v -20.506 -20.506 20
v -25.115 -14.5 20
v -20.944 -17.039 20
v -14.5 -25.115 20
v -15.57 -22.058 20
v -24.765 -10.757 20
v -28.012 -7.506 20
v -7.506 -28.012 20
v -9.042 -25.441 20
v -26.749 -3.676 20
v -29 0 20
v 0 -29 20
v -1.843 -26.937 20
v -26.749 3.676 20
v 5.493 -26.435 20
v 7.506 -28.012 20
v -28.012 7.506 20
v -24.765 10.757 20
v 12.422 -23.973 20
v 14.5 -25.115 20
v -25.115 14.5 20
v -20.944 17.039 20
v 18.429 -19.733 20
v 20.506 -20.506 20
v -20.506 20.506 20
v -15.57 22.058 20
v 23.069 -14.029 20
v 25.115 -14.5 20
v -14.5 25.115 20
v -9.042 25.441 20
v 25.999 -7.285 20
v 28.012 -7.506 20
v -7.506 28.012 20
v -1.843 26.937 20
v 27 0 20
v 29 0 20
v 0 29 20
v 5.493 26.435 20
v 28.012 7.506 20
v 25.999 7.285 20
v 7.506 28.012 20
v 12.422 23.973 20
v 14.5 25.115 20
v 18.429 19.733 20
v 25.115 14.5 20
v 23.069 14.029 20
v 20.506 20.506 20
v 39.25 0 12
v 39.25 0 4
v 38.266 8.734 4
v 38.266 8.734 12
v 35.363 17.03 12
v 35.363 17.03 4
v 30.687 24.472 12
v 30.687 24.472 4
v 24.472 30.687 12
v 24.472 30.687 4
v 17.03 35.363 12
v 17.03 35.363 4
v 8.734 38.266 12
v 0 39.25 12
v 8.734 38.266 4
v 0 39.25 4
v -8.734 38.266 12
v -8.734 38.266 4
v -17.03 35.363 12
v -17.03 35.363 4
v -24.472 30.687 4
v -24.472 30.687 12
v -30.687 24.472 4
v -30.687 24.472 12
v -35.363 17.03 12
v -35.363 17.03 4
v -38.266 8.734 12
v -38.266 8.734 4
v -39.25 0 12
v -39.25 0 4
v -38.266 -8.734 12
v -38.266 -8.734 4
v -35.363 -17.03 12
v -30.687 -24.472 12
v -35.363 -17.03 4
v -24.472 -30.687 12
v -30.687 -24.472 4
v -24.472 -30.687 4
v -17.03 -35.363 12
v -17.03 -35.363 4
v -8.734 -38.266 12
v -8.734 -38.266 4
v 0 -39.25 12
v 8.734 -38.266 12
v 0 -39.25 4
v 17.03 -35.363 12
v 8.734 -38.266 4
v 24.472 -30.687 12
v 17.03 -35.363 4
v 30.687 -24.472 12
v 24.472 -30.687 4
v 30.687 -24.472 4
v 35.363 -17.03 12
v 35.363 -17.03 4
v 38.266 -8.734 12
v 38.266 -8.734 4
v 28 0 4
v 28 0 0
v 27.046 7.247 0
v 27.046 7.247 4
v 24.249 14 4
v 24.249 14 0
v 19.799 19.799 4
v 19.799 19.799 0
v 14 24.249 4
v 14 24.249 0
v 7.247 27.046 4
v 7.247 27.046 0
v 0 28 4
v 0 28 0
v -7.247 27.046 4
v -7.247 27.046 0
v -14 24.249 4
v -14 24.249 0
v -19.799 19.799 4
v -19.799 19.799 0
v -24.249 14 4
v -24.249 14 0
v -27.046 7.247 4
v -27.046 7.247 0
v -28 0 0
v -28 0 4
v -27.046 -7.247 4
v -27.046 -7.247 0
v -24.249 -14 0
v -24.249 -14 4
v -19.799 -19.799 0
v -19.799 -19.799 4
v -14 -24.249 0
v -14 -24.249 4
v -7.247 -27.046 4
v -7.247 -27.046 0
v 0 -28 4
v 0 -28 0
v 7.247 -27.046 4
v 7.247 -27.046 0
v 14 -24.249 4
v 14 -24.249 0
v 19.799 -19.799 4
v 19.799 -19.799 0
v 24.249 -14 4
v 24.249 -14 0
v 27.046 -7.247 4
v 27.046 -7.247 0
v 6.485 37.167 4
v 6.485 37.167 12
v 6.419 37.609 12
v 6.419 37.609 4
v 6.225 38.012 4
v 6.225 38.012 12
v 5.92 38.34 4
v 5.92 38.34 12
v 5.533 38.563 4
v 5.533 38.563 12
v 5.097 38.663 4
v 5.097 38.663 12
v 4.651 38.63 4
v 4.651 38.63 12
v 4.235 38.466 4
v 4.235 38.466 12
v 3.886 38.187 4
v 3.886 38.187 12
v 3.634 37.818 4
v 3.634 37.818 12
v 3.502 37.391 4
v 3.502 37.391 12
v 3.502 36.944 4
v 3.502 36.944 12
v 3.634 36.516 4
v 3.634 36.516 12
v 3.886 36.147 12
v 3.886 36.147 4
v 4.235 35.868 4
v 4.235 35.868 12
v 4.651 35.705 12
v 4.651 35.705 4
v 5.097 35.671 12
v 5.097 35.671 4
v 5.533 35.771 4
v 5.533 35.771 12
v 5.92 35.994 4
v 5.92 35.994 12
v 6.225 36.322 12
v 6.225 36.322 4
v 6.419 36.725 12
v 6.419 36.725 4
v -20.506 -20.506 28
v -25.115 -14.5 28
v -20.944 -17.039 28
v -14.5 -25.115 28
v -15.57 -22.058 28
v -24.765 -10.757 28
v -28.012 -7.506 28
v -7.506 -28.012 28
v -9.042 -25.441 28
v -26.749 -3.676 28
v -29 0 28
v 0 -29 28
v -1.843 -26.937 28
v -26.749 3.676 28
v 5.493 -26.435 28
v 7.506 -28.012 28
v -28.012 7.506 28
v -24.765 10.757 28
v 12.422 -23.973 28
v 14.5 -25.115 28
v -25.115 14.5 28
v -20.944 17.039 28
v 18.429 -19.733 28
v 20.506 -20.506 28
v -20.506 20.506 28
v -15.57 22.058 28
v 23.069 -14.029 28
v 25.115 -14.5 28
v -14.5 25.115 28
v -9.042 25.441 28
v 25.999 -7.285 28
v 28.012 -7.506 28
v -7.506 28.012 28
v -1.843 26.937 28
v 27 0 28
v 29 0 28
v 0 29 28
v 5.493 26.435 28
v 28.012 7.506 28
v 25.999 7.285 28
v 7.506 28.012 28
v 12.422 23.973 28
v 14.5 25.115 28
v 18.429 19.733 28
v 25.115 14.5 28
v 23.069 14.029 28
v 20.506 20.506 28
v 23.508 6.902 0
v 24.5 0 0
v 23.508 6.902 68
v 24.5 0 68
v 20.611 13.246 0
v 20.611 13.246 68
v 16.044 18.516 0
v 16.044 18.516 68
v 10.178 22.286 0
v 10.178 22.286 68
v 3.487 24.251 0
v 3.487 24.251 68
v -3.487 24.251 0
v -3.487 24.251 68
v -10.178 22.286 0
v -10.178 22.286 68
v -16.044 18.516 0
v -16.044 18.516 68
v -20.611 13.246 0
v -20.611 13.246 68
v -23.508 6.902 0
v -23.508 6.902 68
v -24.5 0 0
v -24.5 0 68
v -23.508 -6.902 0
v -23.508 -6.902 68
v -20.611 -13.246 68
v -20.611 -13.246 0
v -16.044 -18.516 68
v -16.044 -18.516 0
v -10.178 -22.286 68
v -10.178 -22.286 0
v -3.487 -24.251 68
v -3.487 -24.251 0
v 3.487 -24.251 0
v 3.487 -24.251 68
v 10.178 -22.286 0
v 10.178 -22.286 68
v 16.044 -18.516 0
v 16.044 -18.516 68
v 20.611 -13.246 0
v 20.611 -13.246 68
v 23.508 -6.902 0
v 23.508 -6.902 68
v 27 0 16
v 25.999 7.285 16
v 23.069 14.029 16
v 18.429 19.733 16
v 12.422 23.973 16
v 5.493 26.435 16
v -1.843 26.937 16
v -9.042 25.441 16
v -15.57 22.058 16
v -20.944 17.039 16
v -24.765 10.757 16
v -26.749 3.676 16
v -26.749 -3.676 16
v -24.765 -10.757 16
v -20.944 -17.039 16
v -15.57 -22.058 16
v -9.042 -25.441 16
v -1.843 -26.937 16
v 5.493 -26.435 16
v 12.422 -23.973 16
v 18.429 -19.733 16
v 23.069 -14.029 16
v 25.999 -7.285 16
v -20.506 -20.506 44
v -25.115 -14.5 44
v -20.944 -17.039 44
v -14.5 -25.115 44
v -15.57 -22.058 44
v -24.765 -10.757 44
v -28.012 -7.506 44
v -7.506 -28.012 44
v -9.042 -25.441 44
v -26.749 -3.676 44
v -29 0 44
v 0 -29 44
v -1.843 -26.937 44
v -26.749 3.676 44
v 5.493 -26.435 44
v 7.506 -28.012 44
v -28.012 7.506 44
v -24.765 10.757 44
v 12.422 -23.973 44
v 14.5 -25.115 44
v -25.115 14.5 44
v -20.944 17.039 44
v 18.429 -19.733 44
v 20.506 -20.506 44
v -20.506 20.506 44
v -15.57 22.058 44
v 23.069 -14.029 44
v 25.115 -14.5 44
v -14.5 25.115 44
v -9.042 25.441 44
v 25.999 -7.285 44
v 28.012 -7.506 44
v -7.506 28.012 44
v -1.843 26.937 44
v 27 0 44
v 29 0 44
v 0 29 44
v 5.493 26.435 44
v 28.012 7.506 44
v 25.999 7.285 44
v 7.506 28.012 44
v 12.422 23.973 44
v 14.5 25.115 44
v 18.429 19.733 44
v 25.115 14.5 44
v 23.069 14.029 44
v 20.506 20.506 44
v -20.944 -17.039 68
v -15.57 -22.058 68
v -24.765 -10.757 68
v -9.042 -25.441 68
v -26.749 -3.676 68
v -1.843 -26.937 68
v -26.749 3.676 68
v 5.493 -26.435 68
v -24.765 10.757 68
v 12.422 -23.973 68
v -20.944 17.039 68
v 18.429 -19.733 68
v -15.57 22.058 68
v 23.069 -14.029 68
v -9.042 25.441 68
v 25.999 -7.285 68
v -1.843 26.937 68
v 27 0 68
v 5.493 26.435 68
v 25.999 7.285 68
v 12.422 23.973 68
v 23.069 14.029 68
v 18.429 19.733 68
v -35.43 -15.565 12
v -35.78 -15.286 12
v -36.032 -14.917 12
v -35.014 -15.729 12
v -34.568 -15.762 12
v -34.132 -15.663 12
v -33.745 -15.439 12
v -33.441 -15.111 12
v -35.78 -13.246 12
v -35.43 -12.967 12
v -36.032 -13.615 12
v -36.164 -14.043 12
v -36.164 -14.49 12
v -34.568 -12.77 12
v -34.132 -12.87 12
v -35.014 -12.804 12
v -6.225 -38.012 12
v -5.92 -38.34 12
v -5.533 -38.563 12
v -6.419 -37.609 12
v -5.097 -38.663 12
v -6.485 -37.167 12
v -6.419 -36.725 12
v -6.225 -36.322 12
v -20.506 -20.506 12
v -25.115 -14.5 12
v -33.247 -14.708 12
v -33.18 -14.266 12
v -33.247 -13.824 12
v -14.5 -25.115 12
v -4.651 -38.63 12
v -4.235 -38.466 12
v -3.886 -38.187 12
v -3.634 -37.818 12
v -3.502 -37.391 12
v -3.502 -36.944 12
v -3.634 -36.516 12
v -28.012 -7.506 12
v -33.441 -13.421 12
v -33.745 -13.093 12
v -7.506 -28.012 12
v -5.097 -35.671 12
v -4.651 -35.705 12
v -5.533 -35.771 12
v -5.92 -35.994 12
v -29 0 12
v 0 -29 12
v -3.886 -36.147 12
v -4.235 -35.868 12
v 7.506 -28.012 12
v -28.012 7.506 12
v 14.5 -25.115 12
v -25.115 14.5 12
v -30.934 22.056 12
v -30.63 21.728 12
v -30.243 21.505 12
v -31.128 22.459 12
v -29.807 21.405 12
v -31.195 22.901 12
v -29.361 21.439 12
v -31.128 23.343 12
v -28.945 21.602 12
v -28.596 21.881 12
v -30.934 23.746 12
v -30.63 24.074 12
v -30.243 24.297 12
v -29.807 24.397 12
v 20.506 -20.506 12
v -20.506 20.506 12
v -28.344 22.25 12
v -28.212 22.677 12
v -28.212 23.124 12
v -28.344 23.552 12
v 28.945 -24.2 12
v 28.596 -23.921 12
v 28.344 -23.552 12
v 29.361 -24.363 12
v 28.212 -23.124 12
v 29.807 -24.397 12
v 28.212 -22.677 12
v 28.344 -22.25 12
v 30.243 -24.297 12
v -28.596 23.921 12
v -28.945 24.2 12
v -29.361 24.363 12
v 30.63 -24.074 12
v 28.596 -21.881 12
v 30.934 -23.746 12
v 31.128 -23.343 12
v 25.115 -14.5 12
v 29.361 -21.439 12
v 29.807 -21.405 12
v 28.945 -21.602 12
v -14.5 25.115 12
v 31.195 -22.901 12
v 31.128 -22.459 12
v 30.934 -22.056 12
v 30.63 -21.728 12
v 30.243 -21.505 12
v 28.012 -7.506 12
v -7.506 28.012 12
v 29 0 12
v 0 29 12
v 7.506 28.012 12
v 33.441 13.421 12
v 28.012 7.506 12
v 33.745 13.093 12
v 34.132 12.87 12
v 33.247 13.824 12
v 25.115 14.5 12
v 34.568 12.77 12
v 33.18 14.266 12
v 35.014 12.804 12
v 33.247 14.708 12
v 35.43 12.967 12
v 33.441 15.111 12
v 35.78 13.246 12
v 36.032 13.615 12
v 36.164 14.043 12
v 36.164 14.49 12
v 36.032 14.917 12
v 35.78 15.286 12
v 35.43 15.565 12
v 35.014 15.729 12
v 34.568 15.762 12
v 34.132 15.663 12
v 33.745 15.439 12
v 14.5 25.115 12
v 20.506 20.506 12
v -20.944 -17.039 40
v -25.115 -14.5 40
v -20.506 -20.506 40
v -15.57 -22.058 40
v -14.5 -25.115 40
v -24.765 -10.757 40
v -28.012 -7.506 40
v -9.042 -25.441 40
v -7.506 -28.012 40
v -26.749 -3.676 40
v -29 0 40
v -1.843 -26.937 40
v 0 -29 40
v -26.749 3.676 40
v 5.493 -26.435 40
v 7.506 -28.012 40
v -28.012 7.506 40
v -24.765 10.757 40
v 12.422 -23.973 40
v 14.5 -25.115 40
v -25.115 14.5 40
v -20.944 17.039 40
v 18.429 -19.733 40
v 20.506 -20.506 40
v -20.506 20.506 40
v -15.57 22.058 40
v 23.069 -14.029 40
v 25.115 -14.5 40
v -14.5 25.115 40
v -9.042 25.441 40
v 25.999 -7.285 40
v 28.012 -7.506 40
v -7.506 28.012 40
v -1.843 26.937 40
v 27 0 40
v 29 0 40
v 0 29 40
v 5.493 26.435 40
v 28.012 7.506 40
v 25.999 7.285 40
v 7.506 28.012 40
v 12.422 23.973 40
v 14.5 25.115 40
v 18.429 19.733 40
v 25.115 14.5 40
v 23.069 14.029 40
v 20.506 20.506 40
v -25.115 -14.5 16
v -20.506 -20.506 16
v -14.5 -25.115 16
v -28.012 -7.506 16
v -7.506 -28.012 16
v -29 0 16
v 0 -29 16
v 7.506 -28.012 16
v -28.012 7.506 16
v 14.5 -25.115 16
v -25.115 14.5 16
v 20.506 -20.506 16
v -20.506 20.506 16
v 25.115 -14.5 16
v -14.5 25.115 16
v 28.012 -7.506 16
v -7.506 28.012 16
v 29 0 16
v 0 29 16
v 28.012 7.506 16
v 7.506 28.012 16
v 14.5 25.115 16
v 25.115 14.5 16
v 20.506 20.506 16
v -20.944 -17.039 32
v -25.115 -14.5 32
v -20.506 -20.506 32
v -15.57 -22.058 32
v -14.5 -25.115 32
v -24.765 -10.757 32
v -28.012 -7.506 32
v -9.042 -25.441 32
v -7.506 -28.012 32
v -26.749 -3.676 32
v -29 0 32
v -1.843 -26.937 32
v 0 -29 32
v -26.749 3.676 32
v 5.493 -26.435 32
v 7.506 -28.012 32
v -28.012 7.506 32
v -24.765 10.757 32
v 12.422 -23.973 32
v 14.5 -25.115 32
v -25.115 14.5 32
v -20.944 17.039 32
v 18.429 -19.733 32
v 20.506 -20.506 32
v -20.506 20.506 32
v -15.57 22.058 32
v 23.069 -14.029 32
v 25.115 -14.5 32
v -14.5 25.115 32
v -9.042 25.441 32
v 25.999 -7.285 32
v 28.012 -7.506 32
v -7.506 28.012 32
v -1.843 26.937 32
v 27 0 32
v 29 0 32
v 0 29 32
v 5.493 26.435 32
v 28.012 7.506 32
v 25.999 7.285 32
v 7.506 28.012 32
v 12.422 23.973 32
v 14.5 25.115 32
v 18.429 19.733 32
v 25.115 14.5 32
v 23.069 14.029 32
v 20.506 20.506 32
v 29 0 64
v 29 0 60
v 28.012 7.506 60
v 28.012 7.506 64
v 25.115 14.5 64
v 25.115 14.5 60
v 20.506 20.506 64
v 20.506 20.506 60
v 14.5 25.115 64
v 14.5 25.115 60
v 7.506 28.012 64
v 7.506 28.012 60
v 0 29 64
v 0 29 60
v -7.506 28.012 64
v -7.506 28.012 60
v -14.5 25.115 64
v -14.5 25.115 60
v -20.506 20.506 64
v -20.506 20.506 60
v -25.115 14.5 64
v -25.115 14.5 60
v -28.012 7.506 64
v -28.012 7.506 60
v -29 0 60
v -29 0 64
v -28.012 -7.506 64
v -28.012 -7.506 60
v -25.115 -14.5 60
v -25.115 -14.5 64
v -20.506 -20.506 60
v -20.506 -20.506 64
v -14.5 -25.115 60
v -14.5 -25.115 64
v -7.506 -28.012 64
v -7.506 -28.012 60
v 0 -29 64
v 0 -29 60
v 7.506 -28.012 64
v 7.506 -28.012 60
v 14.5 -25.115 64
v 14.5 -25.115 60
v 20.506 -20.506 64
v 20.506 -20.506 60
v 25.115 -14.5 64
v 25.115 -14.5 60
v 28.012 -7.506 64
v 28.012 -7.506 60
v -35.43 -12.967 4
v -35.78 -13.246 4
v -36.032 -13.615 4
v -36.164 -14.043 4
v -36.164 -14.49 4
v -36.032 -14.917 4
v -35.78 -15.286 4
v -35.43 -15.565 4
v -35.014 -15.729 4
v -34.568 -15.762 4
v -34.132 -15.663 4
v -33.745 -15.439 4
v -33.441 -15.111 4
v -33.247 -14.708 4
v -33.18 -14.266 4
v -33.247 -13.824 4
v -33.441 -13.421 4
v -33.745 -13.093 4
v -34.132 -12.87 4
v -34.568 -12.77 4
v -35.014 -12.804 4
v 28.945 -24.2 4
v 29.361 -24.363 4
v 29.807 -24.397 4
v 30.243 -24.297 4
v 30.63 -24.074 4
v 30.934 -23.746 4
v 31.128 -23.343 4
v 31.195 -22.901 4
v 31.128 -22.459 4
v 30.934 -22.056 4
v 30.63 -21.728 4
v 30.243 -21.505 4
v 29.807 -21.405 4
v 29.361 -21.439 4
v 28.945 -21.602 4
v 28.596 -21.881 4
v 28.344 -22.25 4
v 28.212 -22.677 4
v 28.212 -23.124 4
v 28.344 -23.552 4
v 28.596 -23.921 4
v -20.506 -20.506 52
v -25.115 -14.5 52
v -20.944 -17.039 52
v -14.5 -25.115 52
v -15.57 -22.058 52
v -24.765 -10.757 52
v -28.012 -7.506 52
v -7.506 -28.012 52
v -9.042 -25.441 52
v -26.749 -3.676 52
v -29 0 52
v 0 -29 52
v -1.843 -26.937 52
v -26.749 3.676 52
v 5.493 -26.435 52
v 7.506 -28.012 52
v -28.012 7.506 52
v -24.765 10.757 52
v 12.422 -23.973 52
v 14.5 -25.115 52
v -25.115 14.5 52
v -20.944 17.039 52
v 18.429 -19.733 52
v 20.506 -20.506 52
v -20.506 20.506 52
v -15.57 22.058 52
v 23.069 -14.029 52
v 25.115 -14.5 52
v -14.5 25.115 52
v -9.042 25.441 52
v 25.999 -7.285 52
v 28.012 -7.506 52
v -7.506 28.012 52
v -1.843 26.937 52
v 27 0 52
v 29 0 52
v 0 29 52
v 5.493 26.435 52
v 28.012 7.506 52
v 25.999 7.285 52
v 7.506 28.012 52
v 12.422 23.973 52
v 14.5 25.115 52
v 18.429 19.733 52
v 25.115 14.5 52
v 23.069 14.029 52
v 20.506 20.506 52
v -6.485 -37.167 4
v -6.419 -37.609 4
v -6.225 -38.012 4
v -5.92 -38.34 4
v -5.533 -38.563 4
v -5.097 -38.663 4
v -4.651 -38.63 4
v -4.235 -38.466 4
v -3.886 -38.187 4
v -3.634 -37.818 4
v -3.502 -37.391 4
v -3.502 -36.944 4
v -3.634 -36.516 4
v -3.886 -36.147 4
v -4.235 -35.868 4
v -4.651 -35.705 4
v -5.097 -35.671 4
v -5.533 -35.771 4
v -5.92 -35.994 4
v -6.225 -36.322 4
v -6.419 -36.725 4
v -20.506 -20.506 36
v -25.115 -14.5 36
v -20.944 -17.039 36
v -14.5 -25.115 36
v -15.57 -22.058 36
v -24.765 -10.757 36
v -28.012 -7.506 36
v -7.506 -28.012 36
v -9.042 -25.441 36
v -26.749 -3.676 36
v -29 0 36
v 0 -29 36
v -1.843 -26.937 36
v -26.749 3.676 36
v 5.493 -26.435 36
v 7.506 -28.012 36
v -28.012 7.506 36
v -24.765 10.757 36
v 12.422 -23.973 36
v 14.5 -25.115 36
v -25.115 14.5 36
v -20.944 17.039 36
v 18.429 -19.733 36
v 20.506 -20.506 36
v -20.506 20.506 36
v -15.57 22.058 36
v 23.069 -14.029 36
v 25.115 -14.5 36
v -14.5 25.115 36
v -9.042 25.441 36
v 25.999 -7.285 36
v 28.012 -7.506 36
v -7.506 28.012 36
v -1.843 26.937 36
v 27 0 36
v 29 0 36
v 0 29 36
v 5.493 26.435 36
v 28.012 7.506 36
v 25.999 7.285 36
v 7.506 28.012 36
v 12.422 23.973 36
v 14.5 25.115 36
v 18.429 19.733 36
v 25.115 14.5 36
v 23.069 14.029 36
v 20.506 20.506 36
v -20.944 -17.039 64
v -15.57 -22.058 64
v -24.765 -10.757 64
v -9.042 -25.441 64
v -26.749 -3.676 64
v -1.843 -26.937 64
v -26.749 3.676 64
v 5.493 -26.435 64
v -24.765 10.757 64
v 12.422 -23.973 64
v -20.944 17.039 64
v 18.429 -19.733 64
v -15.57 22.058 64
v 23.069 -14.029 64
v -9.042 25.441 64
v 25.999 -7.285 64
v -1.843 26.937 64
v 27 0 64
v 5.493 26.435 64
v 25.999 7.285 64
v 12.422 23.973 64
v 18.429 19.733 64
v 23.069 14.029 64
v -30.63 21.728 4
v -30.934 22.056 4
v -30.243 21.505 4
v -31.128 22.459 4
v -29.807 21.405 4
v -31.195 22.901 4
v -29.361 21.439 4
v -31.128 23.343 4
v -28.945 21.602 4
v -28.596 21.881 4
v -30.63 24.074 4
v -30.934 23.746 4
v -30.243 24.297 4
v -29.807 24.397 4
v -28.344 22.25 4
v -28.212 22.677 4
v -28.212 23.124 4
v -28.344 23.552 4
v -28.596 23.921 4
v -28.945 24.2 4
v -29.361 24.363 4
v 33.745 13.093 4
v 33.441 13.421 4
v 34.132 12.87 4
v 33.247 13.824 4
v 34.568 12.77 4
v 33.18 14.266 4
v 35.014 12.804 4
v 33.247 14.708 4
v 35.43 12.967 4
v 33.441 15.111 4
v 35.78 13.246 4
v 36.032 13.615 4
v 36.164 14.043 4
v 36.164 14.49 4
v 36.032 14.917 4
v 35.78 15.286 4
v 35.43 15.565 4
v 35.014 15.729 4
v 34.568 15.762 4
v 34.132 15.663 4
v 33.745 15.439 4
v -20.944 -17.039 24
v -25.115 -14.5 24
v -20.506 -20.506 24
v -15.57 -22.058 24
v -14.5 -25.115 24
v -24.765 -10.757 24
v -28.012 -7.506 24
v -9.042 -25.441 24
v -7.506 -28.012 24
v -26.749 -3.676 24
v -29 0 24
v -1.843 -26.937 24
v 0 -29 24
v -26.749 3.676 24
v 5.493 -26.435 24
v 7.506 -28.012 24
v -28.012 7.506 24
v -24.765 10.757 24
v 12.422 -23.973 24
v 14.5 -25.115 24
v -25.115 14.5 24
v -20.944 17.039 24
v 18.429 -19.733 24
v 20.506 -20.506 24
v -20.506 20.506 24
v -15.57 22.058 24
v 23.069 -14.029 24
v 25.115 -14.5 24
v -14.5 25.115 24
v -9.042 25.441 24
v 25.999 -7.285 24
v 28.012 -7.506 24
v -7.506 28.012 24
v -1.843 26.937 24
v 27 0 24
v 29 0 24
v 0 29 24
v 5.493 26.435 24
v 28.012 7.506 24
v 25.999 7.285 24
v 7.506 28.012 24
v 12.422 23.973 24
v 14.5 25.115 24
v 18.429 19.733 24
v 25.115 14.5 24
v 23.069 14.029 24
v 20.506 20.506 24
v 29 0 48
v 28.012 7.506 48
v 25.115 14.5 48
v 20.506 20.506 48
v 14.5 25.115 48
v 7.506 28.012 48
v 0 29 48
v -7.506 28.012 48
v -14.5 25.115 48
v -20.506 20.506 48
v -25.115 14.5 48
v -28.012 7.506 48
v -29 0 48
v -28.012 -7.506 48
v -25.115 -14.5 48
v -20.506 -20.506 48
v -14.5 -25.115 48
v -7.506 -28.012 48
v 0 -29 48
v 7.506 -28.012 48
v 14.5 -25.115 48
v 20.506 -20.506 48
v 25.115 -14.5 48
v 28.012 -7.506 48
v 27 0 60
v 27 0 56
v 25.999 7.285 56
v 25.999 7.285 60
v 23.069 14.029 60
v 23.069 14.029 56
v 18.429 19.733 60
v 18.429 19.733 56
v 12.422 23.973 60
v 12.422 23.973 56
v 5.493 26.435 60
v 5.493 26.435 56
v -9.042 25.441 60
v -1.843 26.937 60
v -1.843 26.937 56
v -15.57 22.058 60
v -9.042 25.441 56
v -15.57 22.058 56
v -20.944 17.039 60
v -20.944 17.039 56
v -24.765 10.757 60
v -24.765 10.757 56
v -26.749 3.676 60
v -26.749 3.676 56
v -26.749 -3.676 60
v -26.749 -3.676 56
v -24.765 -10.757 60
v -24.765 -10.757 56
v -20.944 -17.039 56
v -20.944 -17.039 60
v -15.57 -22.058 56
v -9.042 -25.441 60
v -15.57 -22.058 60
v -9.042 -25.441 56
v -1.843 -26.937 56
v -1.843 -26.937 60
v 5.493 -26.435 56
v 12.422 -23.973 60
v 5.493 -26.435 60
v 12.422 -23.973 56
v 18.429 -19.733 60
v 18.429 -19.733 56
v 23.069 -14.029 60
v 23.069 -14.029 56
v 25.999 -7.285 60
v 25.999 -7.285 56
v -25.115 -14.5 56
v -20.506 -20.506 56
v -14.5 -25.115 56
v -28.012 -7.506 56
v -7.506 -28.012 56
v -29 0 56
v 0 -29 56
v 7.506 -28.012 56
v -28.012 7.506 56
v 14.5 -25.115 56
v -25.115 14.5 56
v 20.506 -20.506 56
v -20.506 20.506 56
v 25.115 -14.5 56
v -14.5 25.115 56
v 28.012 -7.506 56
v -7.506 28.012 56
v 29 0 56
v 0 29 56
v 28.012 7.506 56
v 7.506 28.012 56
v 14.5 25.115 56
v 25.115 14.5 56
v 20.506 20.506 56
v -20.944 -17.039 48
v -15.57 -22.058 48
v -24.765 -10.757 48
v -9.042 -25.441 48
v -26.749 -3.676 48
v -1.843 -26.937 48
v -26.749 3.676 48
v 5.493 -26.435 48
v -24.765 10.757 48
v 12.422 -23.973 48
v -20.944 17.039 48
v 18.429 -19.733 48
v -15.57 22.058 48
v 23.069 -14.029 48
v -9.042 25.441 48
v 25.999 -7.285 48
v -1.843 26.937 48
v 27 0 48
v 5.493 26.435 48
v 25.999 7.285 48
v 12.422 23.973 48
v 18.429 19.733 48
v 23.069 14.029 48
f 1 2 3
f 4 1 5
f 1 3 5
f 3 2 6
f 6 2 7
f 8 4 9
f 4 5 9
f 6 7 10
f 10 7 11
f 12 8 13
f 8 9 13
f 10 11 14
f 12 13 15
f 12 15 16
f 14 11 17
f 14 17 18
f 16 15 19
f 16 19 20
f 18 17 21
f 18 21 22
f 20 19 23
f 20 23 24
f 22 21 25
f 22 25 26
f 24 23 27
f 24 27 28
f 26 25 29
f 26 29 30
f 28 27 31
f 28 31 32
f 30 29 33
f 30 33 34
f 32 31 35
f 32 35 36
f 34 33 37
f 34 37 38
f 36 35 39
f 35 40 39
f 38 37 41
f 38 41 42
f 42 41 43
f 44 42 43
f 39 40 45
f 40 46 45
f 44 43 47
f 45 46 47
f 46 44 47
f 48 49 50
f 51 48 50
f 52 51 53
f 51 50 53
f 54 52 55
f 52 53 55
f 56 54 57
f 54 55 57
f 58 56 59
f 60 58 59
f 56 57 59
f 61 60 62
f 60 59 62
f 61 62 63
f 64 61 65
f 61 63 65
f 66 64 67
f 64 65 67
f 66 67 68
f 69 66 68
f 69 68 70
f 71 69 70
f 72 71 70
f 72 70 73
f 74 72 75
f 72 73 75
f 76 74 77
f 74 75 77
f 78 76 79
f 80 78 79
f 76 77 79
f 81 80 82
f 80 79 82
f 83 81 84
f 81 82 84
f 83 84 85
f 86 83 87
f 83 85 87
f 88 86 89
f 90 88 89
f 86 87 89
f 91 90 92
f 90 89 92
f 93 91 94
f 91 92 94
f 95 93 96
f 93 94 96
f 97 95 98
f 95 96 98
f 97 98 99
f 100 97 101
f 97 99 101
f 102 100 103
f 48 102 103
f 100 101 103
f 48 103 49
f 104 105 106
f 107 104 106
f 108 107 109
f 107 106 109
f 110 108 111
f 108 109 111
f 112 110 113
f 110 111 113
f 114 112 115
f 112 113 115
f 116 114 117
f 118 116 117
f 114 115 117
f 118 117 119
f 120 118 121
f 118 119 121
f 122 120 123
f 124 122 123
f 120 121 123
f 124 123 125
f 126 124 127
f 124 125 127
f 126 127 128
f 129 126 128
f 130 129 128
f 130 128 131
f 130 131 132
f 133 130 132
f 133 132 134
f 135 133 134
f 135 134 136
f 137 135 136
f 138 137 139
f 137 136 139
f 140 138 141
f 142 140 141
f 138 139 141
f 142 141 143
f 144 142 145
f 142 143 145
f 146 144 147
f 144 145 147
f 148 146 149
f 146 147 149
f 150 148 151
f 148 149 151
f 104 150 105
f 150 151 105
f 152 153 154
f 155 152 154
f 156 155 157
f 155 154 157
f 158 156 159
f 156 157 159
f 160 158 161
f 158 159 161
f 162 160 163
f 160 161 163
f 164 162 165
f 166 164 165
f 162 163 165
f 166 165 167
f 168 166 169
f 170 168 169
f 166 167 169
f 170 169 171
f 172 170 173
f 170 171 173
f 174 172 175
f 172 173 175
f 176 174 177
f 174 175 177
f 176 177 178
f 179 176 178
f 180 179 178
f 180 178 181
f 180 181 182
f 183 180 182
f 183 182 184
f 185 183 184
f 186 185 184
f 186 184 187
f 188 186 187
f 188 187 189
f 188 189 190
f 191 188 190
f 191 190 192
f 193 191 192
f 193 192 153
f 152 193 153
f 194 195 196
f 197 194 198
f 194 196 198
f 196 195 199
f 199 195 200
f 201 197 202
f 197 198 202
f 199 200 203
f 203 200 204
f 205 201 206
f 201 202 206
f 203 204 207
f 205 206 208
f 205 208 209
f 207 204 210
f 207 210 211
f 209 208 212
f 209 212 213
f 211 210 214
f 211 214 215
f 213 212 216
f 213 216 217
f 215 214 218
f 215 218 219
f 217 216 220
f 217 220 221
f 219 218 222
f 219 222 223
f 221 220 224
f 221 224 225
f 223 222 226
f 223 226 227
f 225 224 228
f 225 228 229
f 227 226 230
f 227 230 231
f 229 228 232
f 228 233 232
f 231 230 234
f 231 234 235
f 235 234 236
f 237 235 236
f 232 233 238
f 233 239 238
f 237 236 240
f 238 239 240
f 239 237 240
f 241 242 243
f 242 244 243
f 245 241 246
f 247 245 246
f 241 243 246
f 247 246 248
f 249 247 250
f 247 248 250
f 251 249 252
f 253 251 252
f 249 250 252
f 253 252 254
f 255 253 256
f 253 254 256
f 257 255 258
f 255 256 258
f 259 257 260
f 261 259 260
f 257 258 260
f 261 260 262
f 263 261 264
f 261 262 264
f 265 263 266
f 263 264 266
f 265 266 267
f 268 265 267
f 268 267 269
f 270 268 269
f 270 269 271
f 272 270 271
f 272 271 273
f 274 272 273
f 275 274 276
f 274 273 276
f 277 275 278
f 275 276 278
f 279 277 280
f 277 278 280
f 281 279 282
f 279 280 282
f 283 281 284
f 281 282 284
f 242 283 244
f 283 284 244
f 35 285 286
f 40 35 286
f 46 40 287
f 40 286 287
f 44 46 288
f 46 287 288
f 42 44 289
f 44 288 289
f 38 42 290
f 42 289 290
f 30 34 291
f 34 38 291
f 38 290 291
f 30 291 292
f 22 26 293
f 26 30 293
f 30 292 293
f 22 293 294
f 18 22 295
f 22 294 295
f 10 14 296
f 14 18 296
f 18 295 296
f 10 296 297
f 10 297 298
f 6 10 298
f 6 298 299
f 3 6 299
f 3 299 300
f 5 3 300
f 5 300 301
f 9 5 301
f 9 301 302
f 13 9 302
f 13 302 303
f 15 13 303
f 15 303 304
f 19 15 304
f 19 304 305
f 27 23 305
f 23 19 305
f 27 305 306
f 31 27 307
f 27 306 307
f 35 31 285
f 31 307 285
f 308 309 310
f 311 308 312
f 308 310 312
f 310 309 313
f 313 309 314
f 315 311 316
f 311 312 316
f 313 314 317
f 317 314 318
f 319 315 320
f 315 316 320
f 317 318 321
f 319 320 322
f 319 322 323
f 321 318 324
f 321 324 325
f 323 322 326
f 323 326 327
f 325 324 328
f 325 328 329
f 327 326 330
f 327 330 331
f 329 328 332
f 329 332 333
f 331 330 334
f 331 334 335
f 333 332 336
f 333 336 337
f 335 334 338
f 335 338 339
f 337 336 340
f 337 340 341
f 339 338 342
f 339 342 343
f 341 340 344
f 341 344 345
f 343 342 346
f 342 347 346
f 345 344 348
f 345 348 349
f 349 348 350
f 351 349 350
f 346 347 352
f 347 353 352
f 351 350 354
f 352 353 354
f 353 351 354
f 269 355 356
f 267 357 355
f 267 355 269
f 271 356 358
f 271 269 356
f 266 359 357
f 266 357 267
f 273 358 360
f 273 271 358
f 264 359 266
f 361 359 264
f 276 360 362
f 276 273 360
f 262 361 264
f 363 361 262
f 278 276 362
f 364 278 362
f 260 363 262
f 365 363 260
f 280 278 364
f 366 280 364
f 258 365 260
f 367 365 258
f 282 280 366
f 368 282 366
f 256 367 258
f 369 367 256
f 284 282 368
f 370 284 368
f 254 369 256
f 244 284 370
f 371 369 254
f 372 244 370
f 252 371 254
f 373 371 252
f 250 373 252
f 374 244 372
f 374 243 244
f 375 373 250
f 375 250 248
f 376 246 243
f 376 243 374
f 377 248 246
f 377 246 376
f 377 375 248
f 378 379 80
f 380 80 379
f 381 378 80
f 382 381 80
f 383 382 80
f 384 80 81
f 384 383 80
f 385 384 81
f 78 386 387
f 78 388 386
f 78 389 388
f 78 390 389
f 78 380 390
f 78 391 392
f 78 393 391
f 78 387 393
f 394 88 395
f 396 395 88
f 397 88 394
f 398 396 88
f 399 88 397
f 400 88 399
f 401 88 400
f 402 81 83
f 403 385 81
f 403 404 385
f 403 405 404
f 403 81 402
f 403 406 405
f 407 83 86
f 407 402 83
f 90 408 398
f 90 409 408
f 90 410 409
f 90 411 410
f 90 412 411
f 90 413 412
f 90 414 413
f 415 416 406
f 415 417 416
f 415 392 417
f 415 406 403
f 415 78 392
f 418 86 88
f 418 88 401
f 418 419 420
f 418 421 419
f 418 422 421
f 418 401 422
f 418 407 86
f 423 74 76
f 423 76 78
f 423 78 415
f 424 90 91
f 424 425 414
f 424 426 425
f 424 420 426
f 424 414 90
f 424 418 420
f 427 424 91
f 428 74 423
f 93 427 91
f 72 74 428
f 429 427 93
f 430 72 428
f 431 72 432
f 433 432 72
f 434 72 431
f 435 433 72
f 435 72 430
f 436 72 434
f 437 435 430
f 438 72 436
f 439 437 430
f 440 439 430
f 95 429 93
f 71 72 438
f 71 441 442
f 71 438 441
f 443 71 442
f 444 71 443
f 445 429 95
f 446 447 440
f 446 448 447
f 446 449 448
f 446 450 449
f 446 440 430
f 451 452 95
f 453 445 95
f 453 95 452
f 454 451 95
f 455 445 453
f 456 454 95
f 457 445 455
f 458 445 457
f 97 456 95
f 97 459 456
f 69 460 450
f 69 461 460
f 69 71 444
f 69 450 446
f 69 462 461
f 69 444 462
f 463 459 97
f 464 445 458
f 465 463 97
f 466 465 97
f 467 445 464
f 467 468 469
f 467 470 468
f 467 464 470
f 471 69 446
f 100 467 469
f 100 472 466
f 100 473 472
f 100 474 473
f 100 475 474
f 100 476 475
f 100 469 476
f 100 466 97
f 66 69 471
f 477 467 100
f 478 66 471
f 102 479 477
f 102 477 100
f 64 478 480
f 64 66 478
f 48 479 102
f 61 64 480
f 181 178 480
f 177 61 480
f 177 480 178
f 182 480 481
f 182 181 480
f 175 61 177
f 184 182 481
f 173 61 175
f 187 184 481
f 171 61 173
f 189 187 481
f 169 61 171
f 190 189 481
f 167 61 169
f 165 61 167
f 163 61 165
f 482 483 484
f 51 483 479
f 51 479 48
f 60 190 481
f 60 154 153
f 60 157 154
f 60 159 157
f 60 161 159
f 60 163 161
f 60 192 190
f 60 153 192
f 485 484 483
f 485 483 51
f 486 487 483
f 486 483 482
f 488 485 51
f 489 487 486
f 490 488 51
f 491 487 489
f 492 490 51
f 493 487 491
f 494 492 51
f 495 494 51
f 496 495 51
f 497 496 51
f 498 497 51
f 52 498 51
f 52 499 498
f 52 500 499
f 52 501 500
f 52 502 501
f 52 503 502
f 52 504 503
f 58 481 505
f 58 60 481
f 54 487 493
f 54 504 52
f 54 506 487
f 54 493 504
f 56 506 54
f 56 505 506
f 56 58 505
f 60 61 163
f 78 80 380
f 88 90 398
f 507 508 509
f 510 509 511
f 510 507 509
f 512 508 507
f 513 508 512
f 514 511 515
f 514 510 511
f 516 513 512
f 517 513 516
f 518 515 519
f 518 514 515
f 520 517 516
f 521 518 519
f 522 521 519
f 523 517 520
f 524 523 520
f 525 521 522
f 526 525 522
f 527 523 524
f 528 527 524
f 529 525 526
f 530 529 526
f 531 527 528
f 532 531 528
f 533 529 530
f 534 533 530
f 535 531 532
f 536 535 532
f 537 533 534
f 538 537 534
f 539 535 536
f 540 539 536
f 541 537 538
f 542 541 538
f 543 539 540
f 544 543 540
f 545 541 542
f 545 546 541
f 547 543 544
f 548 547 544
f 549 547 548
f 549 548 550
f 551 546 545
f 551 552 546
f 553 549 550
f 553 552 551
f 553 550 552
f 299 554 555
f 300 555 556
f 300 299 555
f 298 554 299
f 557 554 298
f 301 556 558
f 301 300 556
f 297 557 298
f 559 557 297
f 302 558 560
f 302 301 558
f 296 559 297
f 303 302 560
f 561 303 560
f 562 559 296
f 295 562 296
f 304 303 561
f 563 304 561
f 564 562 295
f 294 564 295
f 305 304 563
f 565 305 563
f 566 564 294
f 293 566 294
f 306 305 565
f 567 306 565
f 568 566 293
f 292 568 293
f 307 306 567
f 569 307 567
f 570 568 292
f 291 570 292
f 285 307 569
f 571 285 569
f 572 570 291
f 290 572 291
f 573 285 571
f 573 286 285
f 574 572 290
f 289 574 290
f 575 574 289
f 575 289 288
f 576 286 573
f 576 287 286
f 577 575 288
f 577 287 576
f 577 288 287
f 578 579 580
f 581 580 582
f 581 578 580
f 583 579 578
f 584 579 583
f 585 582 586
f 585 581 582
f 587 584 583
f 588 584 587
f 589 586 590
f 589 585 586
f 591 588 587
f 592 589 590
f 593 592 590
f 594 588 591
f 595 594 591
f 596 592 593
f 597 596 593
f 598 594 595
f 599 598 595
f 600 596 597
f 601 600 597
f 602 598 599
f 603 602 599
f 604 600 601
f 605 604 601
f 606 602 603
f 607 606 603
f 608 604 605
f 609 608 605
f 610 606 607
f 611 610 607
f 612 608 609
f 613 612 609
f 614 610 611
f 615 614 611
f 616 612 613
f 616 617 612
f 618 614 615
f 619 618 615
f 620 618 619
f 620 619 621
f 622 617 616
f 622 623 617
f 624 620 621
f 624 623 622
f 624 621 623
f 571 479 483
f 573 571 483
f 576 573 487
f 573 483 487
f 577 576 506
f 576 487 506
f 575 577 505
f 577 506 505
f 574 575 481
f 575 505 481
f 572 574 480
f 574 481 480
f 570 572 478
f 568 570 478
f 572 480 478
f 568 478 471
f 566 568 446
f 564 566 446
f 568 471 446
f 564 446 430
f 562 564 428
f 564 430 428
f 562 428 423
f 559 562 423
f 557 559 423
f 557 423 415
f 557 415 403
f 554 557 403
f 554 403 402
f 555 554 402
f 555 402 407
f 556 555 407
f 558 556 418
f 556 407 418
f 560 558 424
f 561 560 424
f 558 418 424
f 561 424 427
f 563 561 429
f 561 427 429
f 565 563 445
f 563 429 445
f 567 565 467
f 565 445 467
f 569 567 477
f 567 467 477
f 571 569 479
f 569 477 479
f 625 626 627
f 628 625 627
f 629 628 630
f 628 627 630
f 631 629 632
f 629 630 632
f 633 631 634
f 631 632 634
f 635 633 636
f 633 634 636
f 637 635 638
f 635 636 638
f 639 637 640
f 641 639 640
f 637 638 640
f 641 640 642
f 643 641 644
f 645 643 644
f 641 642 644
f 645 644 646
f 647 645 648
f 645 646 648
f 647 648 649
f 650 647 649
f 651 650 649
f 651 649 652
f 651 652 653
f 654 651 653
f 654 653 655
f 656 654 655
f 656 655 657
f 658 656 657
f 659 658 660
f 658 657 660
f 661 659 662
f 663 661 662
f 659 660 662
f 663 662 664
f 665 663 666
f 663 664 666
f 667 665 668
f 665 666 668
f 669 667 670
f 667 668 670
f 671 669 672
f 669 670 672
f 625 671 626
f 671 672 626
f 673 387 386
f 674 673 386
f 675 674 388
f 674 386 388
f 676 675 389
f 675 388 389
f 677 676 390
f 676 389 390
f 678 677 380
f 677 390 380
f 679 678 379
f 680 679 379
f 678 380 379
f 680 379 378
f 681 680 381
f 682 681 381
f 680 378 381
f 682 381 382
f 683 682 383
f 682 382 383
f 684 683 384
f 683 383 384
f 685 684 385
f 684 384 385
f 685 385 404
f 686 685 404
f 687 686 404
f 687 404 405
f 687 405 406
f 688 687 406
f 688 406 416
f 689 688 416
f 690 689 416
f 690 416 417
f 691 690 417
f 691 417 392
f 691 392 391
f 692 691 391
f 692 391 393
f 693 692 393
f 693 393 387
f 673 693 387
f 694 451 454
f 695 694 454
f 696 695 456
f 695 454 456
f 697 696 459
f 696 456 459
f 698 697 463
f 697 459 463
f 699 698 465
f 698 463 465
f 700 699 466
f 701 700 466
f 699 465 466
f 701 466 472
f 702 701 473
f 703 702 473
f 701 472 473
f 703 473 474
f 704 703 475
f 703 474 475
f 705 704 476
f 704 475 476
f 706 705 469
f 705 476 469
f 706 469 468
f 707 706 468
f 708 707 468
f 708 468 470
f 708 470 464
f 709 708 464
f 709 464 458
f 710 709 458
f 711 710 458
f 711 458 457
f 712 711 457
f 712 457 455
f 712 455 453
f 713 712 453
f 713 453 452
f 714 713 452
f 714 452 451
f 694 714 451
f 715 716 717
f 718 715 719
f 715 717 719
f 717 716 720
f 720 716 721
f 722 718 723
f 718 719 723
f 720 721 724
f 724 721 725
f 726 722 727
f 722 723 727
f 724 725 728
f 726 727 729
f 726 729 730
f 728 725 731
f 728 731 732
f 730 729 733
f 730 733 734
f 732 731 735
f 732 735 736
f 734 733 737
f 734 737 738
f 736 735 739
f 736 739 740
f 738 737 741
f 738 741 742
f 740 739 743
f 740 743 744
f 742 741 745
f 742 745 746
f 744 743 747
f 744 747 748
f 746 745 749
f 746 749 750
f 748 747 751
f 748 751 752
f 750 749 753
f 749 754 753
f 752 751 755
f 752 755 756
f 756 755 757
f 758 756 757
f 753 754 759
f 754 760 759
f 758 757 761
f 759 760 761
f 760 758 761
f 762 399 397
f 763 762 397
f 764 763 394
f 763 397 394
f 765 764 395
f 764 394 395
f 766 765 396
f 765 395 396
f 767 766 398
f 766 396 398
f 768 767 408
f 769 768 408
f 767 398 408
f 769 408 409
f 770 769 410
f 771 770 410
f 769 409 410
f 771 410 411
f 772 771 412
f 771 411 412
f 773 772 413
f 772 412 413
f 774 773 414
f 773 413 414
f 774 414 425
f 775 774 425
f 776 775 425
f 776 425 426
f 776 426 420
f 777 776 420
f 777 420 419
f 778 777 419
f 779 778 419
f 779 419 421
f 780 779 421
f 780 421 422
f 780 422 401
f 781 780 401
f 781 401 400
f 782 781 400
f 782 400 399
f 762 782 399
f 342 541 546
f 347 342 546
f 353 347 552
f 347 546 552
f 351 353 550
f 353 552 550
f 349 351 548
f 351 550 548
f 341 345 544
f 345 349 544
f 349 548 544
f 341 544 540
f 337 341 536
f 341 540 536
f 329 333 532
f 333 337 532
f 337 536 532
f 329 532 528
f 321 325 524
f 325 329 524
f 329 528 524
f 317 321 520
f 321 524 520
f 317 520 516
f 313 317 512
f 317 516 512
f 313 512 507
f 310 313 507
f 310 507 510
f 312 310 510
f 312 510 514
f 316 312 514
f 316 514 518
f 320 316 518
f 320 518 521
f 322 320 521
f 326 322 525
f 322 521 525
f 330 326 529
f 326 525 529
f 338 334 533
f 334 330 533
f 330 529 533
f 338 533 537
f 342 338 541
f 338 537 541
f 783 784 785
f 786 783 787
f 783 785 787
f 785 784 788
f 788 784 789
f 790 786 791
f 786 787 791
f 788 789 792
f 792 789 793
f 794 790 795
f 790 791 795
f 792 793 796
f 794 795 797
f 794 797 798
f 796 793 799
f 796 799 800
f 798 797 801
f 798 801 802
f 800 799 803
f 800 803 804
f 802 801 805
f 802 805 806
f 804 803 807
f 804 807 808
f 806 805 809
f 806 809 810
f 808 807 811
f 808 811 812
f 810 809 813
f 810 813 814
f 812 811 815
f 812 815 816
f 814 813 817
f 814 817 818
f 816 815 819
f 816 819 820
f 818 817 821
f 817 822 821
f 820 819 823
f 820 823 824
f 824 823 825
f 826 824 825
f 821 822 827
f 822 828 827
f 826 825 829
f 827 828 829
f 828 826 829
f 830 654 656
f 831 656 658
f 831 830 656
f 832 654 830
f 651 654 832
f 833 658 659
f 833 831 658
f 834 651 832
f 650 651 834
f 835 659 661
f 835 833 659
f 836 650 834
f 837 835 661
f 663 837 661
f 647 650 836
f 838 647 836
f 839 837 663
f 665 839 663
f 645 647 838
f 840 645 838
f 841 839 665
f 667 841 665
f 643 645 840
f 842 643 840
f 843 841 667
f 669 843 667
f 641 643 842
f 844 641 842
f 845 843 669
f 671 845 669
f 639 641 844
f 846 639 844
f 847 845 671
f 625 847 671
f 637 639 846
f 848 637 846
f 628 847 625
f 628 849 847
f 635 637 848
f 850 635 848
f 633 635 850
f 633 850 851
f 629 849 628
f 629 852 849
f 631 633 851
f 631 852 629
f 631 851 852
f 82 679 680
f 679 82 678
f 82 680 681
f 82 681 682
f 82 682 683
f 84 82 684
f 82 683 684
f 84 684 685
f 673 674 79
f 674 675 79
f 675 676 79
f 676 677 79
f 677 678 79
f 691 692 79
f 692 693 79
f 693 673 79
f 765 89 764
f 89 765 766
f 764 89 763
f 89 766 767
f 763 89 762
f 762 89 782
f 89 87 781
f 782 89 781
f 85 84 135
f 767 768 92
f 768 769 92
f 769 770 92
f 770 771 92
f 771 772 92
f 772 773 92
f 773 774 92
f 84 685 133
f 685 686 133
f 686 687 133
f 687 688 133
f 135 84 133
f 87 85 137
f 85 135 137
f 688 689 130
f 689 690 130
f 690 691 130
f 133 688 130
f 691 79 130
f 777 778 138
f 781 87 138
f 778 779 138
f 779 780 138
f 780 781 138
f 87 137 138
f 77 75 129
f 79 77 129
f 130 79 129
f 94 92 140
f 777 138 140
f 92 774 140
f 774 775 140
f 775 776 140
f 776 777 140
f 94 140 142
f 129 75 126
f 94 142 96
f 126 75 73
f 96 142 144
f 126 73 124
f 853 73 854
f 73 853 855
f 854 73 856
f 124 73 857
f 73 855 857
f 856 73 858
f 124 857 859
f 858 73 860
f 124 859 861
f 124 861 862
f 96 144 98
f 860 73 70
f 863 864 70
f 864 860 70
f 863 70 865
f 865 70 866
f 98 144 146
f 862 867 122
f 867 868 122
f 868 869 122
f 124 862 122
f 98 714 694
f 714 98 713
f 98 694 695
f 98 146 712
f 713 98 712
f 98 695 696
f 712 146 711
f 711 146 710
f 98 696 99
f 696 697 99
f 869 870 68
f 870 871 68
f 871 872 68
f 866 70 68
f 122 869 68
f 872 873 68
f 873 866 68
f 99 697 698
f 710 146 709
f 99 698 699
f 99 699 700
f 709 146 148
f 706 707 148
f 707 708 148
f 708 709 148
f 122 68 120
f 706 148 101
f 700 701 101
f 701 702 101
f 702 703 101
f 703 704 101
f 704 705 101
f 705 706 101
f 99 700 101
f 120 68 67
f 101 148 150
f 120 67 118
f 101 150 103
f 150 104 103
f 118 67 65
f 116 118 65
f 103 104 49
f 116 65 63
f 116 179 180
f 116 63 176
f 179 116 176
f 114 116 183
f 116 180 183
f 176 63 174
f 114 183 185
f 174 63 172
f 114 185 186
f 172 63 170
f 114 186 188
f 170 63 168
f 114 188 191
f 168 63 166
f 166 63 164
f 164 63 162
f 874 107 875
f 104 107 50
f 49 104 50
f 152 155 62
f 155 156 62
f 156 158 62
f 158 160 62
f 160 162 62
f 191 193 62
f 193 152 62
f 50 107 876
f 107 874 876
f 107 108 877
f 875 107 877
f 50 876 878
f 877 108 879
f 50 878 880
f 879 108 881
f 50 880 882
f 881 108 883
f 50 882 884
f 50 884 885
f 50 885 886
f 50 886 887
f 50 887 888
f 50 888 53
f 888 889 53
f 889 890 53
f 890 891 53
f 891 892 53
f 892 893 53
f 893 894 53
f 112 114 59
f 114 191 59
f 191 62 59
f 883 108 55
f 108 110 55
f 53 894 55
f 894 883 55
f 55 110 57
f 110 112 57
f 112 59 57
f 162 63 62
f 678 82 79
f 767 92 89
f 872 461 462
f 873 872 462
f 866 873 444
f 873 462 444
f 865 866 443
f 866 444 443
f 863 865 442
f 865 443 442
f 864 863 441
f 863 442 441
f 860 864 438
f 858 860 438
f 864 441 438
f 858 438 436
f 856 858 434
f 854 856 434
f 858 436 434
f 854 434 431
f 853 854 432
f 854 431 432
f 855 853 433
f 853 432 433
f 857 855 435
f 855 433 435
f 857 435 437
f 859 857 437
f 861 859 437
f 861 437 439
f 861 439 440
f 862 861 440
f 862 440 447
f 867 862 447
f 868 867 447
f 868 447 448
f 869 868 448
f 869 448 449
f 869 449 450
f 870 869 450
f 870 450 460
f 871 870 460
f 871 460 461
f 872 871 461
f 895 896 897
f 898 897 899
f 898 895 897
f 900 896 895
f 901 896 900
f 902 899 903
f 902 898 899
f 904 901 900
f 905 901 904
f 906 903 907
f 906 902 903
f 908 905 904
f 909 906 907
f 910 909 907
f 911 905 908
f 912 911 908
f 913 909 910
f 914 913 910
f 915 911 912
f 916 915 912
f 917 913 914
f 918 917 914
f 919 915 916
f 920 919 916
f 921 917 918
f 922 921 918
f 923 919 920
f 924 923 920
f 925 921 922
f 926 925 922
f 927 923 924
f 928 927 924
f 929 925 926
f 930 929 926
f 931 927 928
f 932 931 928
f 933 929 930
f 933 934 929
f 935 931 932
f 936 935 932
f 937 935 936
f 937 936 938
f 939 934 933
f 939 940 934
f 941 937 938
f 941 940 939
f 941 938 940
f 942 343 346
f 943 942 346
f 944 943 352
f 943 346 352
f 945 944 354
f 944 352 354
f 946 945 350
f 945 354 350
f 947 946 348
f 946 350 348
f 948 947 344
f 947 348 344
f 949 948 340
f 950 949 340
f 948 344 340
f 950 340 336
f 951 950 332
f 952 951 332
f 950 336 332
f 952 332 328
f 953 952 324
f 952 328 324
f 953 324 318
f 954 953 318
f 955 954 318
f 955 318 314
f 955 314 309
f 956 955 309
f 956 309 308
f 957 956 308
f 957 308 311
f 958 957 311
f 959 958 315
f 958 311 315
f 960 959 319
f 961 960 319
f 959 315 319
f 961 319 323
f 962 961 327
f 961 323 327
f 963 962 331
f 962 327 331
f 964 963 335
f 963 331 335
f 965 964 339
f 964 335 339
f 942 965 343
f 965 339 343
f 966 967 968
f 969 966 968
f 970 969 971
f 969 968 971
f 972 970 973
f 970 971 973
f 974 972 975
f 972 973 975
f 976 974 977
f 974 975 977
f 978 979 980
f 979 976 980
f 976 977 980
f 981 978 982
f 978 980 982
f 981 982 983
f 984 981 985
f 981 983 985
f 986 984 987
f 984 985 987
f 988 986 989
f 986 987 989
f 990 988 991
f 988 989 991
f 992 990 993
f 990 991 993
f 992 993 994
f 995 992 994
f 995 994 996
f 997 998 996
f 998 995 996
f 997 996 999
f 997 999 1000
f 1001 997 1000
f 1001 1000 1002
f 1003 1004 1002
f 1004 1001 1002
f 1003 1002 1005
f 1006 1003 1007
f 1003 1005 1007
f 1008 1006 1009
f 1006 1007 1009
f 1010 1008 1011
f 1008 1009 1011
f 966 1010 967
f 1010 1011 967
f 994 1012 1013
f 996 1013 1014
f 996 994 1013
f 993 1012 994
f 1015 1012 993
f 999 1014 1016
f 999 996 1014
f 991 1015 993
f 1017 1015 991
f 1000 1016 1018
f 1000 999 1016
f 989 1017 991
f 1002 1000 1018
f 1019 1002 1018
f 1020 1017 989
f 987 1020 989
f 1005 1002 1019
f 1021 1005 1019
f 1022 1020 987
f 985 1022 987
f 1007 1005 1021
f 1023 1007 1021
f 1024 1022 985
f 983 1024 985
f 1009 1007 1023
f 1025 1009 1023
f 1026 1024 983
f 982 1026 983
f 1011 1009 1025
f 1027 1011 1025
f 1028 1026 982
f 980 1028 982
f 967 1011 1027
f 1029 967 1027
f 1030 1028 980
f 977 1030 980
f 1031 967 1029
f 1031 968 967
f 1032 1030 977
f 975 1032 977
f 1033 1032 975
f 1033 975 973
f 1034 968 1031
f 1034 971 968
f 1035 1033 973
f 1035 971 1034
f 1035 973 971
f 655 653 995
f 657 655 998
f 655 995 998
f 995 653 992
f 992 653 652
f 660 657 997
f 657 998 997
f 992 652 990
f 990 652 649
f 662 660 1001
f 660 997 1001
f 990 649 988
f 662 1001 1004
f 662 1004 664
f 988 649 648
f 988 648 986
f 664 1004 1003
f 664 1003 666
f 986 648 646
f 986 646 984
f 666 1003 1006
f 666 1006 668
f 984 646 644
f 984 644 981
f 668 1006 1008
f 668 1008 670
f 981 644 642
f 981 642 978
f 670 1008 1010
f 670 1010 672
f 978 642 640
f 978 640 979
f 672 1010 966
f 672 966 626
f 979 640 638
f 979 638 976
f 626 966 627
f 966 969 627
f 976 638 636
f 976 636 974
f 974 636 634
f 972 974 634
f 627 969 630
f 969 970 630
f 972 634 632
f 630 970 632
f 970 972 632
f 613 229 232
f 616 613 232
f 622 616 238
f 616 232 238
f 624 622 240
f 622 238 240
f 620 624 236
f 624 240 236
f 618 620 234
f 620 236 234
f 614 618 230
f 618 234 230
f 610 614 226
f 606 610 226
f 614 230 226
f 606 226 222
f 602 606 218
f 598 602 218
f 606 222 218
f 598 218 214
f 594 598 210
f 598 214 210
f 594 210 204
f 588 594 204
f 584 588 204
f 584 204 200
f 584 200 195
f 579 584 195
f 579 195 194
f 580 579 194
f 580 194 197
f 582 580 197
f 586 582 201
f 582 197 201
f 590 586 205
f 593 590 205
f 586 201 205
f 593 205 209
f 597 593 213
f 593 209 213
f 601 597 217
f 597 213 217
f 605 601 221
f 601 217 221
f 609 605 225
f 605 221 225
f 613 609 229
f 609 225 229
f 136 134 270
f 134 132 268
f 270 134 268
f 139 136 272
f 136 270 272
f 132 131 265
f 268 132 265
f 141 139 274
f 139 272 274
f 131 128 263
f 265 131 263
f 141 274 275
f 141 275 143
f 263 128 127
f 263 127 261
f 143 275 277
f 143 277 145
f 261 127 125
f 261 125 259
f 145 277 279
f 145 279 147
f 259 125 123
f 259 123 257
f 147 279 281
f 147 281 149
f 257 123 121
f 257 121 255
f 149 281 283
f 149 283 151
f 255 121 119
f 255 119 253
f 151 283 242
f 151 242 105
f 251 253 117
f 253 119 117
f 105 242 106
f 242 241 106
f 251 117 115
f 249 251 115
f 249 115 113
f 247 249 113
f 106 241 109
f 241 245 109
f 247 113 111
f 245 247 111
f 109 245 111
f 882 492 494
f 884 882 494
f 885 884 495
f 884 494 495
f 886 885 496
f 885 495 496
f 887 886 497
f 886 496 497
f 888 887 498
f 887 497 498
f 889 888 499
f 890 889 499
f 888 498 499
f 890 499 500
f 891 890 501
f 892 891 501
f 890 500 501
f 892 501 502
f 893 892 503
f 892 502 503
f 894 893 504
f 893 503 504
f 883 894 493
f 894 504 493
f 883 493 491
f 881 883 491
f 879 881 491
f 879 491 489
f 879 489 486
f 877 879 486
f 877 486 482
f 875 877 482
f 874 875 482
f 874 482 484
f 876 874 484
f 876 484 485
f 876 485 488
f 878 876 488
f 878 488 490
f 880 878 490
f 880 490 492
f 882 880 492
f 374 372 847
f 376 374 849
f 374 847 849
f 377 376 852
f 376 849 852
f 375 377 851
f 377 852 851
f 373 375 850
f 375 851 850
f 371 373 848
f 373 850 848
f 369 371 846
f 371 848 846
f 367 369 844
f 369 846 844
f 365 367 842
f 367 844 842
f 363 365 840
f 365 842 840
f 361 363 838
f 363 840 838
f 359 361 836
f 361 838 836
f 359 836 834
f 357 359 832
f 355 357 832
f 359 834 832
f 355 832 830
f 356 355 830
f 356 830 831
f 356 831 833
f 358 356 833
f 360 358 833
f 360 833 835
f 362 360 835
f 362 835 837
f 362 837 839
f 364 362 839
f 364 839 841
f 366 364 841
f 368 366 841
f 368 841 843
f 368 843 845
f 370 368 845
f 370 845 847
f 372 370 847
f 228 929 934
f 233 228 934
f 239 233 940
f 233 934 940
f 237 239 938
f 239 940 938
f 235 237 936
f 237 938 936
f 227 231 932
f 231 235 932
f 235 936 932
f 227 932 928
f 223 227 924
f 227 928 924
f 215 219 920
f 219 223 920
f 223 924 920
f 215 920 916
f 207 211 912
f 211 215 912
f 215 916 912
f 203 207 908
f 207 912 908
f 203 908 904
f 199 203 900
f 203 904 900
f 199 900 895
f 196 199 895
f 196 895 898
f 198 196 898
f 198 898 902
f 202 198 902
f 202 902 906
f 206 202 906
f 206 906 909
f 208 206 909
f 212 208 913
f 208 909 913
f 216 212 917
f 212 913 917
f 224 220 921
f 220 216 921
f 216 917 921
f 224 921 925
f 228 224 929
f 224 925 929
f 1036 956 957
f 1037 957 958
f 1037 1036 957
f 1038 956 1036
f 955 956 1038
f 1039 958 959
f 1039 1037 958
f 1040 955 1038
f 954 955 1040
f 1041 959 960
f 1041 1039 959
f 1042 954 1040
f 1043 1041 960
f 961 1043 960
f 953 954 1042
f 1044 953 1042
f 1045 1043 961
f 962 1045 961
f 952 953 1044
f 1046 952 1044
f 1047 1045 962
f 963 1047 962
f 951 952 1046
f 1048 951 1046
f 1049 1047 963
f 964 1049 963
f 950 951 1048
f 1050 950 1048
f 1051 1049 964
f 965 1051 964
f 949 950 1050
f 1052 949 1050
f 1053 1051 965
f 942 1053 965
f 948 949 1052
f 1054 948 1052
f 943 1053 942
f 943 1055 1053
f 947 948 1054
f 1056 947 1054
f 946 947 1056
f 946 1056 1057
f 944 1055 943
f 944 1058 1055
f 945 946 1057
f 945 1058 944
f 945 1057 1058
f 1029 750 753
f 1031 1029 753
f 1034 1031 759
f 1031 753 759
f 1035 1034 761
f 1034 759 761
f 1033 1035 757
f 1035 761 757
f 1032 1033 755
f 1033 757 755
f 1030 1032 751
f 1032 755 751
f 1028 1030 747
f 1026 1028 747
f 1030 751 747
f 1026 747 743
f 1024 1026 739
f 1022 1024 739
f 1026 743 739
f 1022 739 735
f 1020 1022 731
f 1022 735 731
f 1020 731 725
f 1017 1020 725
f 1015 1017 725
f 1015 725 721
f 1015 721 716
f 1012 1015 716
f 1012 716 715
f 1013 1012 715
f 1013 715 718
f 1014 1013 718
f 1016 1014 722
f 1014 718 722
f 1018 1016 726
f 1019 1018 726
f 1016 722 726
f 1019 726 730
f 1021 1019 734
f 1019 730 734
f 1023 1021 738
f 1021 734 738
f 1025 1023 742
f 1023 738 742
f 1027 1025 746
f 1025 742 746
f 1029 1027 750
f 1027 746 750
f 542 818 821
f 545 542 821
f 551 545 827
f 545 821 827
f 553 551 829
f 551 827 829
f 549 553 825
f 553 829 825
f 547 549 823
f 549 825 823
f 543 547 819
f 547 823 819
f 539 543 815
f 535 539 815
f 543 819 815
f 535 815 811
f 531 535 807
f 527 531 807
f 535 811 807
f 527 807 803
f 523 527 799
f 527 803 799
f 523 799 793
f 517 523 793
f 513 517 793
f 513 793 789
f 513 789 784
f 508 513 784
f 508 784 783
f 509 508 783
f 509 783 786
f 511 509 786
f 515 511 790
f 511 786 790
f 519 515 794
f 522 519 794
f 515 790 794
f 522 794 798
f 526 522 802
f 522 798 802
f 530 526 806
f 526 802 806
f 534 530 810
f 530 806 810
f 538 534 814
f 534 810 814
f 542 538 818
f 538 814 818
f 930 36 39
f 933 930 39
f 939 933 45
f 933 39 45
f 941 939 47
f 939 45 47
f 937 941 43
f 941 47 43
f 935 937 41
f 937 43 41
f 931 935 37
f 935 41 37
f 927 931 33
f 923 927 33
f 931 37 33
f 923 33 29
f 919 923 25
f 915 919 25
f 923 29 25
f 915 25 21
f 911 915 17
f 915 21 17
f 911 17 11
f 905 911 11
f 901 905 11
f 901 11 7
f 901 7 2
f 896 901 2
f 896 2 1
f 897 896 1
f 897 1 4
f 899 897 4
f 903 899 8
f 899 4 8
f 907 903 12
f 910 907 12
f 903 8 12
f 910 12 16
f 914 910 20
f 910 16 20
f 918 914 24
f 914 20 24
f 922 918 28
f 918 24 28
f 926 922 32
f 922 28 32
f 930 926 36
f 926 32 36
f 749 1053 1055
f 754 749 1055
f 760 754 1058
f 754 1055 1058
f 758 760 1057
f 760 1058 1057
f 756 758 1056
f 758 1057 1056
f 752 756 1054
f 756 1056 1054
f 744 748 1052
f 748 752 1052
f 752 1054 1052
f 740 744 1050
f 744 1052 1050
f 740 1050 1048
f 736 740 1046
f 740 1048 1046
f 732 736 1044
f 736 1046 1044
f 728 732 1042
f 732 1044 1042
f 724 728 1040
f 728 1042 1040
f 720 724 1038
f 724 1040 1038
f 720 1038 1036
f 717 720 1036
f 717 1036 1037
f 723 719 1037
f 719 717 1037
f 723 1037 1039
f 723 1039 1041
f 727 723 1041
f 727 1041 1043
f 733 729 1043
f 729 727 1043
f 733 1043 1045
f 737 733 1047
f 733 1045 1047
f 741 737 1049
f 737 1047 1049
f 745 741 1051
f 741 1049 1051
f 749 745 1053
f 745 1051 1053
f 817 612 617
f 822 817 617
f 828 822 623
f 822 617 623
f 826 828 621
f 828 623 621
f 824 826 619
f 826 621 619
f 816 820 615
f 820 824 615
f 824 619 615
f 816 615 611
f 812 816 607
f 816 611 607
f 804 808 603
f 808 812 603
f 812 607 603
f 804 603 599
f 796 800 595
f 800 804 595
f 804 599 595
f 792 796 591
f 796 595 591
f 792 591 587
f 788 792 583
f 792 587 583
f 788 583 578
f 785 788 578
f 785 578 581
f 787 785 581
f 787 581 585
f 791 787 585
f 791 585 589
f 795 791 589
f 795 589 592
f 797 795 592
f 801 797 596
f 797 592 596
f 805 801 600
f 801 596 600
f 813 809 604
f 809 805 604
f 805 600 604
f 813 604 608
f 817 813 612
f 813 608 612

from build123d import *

# Parameters (mm, degrees)
SKETCH1_R           = 28
BOSS_EXTRUDE1_DEPTH = 4
SKETCH2_R           = 39.25
BOSS_EXTRUDE2_DEPTH = 8
SKETCH4_R           = 27
BOSS_EXTRUDE3_DEPTH = 56
SKETCH5_R           = 24.5
CUT_EXTRUDE2_DEPTH  = 88.778841414
SKETCH6_R           = 29
BOSS_EXTRUDE4_DEPTH = 4
LPATTERN1_COUNT     = 7
LPATTERN1_PITCH     = 8
SKETCH8_R           = 1.5
CUT_EXTRUDE3_DEPTH  = 79.848747612
CIRPATTERN1_COUNT   = 6
SKETCH9_R           = 24.5
CUT_EXTRUDE4_DEPTH  = 85.71791428


with BuildPart() as part:
    # Sketch1 → Boss-Extrude1 (new body)
    with BuildSketch(Plane.XY):
        Circle(SKETCH1_R)
    extrude(amount=BOSS_EXTRUDE1_DEPTH)

    # Sketch2 → Boss-Extrude2 (add)
    with BuildSketch(Plane.XY.offset(4)):
        Circle(SKETCH2_R)
    extrude(amount=BOSS_EXTRUDE2_DEPTH)

    # Sketch4 → Boss-Extrude3 (add)
    with BuildSketch(Plane.XY.offset(12)):
        Circle(SKETCH4_R)
    extrude(amount=BOSS_EXTRUDE3_DEPTH)

    # Sketch5 → Cut-Extrude2 (cut, through all)
    with BuildSketch(Plane.XY.offset(68)):
        Circle(SKETCH5_R)
    extrude(amount=-CUT_EXTRUDE2_DEPTH, mode=Mode.SUBTRACT)

    # Sketch6 → Boss-Extrude4 (add)
    with BuildSketch(Plane.XY.offset(12)):
        Circle(SKETCH6_R)
    boss_extrude4 = extrude(amount=BOSS_EXTRUDE4_DEPTH)

    # LPattern1: Boss-Extrude4 ×7
    with Locations(*[(0, 0, i * LPATTERN1_PITCH) for i in range(1, LPATTERN1_COUNT)]):
        add(boss_extrude4)

    # Sketch8 → Cut-Extrude3 (cut, through all)
    with BuildSketch(Plane.XY.offset(12)):
        with Locations((4.985240287, 37.167154576)):
            Circle(SKETCH8_R)
    cut_extrude3 = extrude(amount=-CUT_EXTRUDE3_DEPTH, mode=Mode.SUBTRACT)

    # CirPattern1: Cut-Extrude3 ×6 about axis
    cirpattern1_axis = Axis((0, 0, 0), (0, 0, 1))
    for i in range(1, CIRPATTERN1_COUNT):
        add(cut_extrude3.rotate(cirpattern1_axis, i * 360 / CIRPATTERN1_COUNT), mode=Mode.SUBTRACT)

    # Sketch9 → Cut-Extrude4 (cut, through all)
    with BuildSketch(Plane.XY.offset(64)):
        Circle(SKETCH9_R)
    extrude(amount=-CUT_EXTRUDE4_DEPTH, mode=Mode.SUBTRACT)


solid = part.part
